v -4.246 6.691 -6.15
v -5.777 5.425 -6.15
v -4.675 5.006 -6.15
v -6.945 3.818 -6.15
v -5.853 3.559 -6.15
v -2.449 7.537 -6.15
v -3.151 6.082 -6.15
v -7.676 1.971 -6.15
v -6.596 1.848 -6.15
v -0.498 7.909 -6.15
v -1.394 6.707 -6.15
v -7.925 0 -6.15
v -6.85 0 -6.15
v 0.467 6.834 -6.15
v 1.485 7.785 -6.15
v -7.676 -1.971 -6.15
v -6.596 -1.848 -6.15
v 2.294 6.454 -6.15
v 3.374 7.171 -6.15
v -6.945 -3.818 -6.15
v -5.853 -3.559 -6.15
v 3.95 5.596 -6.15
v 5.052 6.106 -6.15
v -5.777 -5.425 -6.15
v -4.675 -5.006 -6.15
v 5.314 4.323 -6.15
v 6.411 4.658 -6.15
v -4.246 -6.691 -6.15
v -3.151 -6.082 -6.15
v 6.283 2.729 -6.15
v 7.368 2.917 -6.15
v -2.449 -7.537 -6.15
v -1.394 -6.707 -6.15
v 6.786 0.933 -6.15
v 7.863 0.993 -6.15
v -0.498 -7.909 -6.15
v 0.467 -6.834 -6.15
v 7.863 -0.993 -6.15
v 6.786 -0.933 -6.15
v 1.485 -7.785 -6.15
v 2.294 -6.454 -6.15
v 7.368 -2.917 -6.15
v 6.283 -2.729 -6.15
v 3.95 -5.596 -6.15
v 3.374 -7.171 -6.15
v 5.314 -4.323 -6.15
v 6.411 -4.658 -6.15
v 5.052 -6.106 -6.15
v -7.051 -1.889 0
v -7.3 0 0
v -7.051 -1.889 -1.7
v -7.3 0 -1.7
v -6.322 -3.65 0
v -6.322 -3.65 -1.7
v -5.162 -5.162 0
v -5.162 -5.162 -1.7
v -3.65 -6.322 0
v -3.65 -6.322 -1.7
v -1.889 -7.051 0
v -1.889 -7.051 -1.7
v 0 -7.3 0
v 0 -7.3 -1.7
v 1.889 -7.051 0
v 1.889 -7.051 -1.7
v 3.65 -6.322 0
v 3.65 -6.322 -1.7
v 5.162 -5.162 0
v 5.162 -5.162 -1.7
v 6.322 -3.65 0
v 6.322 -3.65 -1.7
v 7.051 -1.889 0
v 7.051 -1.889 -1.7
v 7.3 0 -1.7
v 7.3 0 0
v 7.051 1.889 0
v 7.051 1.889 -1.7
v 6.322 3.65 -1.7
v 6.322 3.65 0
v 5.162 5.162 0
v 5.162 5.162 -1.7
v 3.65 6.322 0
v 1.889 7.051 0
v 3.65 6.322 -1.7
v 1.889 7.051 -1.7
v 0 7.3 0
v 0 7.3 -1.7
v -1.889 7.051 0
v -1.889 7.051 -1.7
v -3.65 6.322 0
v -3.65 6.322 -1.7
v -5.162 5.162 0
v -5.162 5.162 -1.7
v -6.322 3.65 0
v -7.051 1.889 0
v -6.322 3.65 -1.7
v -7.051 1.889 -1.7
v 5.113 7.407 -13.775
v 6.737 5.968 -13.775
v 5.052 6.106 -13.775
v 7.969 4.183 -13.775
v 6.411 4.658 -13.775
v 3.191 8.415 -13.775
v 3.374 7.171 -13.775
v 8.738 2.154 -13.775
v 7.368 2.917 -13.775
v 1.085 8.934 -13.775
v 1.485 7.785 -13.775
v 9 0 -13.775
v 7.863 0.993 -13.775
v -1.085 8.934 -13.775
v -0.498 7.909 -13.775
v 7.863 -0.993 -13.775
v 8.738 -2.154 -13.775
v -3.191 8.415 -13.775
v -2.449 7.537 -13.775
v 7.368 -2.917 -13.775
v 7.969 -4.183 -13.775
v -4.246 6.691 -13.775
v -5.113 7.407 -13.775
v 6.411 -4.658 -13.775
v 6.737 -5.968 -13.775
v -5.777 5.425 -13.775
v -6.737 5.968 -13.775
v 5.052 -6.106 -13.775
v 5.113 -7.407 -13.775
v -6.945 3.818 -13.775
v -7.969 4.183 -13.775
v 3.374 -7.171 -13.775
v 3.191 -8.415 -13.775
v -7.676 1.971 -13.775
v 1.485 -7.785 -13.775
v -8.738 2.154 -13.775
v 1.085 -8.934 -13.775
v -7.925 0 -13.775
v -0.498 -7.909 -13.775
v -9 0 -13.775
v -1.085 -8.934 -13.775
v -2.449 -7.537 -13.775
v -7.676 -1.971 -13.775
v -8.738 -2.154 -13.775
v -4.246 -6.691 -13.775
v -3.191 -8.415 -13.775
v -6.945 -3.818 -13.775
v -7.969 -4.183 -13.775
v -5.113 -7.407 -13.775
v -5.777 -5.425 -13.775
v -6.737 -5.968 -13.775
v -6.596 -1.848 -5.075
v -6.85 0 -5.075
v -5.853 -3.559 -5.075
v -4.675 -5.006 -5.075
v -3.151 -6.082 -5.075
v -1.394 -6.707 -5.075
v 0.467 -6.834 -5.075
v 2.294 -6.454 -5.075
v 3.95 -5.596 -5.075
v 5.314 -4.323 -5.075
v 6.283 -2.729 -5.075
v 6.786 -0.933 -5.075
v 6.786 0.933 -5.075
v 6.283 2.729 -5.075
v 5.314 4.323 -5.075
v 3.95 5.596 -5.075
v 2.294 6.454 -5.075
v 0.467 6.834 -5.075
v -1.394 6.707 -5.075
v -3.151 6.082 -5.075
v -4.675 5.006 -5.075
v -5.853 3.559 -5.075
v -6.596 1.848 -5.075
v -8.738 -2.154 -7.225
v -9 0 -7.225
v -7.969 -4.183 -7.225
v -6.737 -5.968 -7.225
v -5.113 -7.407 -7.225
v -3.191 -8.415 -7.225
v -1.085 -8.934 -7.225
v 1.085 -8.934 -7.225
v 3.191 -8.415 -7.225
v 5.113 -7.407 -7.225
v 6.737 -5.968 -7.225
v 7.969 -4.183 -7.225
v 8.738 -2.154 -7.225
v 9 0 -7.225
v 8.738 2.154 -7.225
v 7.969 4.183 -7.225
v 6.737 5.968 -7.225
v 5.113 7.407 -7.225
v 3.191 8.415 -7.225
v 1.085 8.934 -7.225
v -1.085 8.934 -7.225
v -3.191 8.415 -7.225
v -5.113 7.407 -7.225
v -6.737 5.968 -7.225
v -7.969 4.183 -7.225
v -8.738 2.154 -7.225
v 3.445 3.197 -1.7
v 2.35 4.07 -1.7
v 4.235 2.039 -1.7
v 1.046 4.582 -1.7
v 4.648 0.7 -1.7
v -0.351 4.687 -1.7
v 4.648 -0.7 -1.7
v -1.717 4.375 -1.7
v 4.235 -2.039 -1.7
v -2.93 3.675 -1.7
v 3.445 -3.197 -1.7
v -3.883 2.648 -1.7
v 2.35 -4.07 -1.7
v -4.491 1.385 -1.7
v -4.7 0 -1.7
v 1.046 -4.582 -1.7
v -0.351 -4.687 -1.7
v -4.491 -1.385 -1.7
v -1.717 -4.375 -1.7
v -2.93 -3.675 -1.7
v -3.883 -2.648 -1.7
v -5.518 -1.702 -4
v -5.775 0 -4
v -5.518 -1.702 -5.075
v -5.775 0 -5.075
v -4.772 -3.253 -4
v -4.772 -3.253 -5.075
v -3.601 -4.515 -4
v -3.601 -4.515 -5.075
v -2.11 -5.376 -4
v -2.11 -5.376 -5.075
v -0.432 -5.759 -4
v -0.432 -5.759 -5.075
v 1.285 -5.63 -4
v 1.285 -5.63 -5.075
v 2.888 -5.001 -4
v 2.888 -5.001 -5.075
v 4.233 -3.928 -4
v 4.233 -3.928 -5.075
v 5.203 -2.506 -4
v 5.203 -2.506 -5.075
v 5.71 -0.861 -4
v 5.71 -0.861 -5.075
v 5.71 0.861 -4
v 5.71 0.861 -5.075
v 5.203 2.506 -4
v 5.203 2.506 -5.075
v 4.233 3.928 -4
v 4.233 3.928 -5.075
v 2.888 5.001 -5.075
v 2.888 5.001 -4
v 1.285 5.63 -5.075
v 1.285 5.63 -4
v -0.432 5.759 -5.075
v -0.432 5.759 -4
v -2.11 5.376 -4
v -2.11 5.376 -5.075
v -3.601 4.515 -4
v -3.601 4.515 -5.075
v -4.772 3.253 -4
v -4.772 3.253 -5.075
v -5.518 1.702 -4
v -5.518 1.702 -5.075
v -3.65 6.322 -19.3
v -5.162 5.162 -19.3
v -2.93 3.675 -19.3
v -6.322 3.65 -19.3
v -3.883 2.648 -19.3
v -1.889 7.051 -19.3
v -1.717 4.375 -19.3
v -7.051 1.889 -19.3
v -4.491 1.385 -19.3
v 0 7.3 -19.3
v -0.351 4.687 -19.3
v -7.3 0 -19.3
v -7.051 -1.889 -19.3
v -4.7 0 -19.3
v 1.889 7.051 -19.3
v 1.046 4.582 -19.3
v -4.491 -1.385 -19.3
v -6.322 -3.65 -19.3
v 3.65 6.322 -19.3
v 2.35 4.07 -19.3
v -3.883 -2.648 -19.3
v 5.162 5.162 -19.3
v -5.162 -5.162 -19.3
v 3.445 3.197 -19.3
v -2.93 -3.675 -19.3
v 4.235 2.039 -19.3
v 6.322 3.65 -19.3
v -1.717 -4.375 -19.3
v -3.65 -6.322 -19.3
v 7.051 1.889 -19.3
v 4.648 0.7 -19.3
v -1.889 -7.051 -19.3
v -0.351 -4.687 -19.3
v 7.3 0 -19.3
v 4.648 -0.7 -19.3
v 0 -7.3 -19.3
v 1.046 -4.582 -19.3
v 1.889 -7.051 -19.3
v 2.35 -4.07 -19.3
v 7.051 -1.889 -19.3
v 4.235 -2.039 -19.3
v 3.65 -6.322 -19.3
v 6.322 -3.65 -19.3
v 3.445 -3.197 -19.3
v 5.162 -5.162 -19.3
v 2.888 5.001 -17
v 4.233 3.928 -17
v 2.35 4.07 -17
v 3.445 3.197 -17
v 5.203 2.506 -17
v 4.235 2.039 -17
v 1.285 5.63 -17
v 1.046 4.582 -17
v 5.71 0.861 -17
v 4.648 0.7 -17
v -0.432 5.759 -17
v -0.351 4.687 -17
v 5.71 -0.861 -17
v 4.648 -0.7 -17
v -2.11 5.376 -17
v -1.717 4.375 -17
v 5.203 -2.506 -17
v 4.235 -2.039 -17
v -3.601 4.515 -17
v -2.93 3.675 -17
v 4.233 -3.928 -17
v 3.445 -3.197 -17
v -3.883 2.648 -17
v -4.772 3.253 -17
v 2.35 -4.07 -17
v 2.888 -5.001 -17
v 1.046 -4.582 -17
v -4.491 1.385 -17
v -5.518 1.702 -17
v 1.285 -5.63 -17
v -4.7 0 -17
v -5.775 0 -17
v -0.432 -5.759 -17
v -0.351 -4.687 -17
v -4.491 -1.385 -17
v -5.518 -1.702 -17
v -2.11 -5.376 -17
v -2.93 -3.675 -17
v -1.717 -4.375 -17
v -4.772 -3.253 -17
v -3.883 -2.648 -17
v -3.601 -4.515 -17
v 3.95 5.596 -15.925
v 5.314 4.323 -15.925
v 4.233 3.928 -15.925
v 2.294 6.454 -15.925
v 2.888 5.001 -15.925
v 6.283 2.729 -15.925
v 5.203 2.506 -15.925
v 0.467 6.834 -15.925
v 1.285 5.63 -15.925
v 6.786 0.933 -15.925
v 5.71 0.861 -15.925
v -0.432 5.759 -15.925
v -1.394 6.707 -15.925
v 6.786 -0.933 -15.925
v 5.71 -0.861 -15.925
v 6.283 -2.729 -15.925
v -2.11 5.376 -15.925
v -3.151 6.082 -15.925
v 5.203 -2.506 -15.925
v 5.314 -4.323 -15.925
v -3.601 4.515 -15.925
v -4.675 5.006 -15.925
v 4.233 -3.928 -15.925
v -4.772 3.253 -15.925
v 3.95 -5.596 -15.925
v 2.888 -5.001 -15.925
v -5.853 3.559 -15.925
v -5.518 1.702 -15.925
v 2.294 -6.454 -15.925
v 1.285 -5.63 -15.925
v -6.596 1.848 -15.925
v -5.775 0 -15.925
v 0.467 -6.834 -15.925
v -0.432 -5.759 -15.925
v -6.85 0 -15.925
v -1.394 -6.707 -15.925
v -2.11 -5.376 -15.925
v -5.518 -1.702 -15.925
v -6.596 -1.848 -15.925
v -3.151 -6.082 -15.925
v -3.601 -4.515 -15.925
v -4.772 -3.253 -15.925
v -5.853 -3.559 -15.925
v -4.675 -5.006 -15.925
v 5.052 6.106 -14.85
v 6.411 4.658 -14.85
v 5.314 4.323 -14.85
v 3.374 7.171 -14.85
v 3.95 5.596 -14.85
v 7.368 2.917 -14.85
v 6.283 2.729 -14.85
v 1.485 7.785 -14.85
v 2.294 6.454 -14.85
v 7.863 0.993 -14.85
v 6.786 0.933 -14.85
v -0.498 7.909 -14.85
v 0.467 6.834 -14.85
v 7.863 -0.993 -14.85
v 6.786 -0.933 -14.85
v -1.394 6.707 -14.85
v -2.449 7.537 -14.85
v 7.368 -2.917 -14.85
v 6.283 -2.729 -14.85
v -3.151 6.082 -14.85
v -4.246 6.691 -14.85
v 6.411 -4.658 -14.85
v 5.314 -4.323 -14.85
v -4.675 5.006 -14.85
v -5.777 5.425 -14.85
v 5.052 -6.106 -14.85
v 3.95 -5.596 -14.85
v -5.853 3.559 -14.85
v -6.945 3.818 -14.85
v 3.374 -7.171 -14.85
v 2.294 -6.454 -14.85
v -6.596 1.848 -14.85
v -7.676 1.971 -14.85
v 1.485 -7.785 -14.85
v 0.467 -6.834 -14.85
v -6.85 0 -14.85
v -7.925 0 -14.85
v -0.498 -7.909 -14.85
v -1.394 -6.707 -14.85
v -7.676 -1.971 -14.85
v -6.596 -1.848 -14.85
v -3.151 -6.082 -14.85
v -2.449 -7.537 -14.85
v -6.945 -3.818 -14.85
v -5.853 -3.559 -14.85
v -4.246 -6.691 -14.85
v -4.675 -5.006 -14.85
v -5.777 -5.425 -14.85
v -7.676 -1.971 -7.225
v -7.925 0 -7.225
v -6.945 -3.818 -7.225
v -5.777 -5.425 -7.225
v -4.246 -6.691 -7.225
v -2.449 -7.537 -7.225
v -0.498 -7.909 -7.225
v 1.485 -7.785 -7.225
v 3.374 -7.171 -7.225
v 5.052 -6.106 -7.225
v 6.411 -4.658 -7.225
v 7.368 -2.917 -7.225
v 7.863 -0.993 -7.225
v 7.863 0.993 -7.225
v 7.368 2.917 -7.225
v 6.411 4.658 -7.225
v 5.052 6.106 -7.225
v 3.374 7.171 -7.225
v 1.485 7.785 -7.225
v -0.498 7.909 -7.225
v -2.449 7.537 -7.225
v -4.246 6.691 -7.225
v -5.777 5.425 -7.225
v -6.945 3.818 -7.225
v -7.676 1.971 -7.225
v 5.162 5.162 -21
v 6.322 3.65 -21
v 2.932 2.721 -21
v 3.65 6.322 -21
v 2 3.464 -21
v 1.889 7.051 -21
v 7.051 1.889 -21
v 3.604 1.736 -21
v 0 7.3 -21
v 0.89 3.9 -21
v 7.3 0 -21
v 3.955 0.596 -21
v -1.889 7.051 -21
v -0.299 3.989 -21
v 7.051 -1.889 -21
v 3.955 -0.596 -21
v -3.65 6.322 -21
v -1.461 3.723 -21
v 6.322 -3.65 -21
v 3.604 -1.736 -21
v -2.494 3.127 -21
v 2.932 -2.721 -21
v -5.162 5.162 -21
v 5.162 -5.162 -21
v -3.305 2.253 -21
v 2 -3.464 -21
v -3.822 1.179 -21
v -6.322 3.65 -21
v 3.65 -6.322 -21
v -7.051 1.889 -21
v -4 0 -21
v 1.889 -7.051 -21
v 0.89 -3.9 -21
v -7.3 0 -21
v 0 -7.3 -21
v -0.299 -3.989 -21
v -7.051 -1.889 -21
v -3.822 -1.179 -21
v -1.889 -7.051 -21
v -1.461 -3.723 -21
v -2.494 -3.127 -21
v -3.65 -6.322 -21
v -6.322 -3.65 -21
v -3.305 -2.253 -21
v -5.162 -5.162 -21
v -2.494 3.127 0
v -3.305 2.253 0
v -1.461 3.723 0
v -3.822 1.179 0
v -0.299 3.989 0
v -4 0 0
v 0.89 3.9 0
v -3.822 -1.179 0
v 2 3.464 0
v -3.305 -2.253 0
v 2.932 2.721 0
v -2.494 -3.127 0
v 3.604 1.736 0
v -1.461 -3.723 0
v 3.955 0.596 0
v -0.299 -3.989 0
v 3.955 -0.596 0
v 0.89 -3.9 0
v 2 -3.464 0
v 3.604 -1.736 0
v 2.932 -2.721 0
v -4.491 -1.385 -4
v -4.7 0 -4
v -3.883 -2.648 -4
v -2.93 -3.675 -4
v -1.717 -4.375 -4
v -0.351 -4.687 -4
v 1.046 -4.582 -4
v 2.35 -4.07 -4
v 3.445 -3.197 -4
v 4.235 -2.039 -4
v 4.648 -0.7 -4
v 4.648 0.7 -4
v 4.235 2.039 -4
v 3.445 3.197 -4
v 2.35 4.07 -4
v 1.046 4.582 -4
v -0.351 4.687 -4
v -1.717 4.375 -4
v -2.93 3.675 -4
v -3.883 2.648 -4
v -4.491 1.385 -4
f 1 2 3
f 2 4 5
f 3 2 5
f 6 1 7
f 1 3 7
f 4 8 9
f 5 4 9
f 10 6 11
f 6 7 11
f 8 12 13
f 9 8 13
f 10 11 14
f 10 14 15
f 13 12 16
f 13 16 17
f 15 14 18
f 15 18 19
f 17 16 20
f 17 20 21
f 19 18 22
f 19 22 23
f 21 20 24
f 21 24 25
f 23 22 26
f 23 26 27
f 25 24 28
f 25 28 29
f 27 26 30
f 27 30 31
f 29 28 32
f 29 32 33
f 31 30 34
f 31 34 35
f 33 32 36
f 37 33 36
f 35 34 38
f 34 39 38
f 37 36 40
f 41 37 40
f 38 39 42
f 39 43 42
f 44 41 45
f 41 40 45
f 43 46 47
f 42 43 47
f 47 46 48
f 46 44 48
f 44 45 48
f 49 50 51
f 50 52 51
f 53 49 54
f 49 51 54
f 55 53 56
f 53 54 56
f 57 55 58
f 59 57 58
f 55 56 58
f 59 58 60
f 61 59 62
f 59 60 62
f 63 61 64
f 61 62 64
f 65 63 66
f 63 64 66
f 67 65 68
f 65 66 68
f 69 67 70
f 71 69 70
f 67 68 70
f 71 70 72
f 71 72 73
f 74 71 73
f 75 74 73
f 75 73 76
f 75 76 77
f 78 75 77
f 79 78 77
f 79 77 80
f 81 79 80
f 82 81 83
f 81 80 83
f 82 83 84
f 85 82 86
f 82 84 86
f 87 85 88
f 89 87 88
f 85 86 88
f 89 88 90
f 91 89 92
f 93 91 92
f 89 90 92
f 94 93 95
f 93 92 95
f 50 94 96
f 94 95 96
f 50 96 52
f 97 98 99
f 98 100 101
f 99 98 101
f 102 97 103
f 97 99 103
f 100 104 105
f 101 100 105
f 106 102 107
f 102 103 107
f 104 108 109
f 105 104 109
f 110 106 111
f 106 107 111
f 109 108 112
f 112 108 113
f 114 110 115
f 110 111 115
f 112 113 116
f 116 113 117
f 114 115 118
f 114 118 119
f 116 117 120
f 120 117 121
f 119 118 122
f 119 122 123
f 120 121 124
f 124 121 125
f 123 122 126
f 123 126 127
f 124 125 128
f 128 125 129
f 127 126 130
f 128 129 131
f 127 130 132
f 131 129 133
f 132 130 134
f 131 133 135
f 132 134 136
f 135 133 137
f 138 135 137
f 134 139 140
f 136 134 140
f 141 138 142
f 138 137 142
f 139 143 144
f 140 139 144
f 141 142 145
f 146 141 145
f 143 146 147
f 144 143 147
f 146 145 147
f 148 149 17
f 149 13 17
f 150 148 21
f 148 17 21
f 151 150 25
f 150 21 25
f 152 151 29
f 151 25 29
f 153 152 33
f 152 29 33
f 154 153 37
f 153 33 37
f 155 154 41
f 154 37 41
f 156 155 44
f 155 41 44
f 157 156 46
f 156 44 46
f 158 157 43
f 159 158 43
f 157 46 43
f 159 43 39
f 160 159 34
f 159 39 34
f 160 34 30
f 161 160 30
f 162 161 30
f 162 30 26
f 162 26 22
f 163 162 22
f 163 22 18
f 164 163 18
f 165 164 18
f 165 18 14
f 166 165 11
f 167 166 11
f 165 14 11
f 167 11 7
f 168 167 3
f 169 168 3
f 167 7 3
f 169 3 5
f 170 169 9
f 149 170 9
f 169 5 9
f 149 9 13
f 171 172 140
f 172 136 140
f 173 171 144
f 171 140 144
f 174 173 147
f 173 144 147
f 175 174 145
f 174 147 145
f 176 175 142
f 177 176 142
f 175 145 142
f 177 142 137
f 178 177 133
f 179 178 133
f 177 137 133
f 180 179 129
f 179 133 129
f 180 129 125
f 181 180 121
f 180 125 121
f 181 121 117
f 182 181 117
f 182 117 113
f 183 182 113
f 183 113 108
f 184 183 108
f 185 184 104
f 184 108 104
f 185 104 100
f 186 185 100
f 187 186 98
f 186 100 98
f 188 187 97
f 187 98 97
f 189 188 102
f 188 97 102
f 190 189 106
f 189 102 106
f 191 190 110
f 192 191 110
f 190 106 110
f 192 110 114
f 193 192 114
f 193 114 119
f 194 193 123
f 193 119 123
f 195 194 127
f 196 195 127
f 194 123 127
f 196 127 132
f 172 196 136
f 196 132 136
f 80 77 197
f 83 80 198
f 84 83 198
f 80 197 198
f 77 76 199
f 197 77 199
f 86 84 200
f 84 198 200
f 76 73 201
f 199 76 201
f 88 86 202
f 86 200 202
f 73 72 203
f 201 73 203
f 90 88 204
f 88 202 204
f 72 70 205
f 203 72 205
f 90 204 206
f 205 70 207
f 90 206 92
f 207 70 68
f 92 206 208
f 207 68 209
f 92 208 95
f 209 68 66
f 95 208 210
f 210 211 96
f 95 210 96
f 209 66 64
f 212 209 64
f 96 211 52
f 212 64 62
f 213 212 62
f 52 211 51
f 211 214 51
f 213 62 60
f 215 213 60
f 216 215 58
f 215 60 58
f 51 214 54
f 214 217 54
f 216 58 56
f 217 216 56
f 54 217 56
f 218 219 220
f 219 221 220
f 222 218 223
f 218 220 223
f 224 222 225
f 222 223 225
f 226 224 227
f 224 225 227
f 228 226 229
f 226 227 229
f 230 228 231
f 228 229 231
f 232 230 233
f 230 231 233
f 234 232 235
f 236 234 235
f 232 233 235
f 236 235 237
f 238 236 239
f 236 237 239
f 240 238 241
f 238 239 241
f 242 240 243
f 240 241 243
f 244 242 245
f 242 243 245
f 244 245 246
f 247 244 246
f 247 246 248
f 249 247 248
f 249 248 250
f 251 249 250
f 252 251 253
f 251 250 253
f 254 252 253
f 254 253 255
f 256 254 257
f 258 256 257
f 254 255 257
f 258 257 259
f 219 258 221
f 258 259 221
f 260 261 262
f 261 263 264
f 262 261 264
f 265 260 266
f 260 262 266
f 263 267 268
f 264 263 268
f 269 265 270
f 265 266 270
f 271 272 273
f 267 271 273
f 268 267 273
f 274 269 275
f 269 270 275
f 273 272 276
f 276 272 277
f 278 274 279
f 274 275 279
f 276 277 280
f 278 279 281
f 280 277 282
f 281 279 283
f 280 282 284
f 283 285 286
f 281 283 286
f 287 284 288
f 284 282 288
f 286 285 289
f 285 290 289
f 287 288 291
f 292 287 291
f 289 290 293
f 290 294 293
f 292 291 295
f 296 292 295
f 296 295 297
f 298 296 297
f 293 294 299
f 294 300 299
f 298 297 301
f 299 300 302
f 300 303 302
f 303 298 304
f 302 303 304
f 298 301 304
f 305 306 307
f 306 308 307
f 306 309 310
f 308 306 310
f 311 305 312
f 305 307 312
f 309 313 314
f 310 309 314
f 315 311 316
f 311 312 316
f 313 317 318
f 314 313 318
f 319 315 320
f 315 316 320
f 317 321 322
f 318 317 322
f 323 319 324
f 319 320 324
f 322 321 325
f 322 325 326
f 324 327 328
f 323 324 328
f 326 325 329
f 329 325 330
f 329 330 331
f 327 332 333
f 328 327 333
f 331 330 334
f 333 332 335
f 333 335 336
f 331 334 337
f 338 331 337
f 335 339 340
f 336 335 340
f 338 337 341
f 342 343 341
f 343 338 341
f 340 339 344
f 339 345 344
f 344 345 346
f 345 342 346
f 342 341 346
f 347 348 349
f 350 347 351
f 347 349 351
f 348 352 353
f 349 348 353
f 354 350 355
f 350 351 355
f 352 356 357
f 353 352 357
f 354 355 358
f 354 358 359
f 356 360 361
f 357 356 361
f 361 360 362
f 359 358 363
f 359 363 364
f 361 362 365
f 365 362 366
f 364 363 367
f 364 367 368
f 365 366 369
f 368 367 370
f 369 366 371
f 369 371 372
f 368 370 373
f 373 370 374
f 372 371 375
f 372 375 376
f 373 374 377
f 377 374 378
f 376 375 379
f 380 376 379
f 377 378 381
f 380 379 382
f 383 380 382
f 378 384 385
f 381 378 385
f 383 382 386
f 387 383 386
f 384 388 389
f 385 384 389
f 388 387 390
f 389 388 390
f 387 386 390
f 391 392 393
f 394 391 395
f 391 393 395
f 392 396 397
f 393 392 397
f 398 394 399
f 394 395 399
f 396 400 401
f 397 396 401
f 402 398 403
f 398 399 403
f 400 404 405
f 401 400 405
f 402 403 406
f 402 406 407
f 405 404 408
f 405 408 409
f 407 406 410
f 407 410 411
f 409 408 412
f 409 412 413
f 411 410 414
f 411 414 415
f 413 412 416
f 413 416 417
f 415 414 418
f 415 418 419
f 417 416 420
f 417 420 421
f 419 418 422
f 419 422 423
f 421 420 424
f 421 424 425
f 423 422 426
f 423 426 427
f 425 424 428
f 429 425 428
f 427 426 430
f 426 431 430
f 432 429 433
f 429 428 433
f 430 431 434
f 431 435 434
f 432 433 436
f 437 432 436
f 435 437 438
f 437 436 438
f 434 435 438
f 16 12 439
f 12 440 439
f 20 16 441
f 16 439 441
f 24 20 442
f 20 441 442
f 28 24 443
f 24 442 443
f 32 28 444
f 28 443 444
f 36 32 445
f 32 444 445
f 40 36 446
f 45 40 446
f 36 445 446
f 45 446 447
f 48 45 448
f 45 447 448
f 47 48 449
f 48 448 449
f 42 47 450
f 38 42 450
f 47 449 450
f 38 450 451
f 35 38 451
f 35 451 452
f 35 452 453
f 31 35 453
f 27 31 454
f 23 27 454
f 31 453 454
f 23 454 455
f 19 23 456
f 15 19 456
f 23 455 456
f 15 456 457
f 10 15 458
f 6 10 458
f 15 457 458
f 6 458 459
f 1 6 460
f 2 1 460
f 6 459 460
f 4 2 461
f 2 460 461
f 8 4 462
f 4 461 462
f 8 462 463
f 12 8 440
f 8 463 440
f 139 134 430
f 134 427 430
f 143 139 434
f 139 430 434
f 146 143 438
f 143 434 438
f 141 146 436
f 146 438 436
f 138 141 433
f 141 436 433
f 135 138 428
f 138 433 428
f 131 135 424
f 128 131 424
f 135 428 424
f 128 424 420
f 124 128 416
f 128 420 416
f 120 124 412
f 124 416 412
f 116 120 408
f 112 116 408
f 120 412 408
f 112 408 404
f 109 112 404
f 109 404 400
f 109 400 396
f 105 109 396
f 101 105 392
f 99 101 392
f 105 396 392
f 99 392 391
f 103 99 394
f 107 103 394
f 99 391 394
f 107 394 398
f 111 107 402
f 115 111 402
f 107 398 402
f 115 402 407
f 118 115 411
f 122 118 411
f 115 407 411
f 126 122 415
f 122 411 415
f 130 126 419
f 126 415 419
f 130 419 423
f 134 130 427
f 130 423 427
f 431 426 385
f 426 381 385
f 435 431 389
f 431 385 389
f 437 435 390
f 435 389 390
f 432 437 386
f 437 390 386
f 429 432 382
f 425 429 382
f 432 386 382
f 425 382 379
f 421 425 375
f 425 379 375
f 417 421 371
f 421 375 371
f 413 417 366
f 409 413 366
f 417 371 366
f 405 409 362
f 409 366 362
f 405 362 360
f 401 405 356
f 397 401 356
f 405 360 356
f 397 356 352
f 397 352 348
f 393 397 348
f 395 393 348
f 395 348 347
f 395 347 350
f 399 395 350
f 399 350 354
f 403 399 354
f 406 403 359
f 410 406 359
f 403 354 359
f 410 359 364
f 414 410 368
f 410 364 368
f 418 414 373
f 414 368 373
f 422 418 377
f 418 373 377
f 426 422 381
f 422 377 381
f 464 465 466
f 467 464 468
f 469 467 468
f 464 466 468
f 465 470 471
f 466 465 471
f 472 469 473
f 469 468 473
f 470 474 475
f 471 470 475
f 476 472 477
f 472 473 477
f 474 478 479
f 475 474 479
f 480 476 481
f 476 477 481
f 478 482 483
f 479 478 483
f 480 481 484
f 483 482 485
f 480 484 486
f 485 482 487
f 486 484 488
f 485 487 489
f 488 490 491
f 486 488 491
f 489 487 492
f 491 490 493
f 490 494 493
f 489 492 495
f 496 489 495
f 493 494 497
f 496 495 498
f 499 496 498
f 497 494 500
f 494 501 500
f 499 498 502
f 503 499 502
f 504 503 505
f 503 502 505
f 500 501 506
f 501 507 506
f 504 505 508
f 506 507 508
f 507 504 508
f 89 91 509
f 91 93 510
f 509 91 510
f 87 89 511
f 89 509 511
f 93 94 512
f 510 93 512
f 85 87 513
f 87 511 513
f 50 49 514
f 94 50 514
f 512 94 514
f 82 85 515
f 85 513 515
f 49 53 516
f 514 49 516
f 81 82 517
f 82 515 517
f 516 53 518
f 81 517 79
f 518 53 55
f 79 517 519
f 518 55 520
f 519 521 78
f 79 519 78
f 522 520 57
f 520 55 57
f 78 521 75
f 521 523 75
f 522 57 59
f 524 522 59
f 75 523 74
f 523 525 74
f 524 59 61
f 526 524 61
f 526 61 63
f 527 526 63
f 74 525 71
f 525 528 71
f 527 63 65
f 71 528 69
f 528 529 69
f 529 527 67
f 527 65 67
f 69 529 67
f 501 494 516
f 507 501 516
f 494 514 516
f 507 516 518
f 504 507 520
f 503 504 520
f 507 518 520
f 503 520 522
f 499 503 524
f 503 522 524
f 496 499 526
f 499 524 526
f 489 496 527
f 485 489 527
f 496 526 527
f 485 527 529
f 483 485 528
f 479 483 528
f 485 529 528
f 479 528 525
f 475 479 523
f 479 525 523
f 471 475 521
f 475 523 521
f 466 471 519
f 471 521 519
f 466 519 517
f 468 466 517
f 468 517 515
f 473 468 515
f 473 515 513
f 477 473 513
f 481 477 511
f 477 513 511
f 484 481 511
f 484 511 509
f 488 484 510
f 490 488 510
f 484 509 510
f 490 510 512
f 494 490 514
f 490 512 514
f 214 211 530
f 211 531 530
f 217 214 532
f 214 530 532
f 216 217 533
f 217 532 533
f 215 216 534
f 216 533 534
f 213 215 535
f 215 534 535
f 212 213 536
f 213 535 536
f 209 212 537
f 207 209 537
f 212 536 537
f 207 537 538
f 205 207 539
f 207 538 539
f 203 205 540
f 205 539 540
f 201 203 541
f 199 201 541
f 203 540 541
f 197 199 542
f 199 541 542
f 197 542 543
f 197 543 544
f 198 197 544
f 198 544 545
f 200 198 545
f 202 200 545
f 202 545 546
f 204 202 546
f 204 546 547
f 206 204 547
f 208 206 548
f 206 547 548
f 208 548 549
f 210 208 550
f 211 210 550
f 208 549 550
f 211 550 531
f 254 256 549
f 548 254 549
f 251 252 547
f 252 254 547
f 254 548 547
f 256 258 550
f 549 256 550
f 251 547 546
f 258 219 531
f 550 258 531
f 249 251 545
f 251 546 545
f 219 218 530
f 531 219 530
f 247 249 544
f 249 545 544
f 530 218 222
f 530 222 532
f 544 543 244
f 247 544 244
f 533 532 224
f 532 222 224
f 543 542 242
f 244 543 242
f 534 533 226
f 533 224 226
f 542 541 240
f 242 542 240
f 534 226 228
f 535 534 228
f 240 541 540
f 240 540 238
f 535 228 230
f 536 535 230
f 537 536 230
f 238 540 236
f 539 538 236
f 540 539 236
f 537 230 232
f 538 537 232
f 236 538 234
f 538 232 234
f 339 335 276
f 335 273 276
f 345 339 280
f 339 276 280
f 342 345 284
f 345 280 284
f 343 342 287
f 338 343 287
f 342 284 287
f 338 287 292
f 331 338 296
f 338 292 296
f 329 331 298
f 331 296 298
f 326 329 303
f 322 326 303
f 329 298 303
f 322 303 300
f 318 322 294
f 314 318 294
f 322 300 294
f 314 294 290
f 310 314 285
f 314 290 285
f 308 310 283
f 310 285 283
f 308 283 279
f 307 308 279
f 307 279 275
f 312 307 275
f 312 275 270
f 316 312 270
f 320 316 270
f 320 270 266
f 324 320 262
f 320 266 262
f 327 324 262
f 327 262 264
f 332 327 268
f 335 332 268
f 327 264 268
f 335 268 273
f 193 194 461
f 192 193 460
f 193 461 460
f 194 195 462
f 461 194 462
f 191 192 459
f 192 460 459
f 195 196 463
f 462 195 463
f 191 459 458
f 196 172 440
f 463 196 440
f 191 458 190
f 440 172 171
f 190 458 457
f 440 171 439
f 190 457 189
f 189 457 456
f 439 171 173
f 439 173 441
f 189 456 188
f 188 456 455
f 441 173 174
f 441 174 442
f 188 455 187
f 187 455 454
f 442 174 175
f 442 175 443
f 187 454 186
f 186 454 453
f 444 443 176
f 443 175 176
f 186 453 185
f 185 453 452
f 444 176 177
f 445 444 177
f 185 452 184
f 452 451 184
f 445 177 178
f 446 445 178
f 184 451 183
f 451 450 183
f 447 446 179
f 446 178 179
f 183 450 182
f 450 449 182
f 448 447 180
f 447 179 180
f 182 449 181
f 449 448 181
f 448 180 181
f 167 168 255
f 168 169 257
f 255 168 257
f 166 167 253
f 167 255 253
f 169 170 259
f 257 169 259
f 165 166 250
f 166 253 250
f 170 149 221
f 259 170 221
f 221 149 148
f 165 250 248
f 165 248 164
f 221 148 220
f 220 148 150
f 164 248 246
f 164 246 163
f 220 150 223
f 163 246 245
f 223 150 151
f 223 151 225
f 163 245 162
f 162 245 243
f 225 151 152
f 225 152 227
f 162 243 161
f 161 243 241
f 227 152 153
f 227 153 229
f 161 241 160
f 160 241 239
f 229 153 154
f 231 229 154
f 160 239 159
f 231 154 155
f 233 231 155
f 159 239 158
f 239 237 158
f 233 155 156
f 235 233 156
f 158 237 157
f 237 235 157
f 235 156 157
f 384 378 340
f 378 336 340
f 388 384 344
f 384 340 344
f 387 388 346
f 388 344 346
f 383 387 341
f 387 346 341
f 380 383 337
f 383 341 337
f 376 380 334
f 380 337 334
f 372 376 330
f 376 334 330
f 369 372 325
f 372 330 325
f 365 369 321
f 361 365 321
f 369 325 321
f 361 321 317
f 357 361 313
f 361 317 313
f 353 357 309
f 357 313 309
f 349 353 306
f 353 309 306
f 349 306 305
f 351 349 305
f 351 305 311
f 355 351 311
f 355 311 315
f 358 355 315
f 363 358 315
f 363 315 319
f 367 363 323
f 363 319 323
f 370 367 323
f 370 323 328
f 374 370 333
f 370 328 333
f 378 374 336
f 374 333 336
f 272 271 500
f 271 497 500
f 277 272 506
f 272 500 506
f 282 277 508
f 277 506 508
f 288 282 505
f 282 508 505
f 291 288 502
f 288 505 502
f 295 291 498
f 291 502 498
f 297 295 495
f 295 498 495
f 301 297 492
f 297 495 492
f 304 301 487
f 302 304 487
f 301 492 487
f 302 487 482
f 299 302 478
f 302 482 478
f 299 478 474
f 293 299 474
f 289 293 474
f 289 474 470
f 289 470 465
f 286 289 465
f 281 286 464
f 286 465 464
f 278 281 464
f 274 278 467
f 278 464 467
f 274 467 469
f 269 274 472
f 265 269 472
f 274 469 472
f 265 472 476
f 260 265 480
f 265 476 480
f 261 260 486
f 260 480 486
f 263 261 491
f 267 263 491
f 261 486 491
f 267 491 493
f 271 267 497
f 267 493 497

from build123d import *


with BuildPart() as part:
    # Sketch1 → Revolve1 (revolve)
    with BuildSketch(Plane(origin=(0, 0, 0), x_dir=(1, 0, 0), z_dir=(0, 1, 0)), mode=Mode.PRIVATE) as revolve1_sk:
        Polygon((4, 0), (7.3, 0), (7.3, 1.7), (4.7, 1.7), (4.7, 4), (5.775, 4), (5.775, 5.075), (6.85, 5.075), (6.85, 6.15), (7.925, 6.15), (7.925, 7.225), (9, 7.225), (9, 8.3), (9, 12.7), (9, 13.775), (7.925, 13.775), (7.925, 14.85), (6.85, 14.85), (6.85, 15.925), (5.775, 15.925), (5.775, 17), (4.7, 17), (4.7, 19.3), (7.3, 19.3), (7.3, 21), (4, 21), align=None)
    revolve(revolve1_sk.sketch.rotate(Axis((0, 0, -15), (0, 0, 1)), 180), axis=Axis((0, 0, -15), (0, 0, 1)))


solid = part.part
